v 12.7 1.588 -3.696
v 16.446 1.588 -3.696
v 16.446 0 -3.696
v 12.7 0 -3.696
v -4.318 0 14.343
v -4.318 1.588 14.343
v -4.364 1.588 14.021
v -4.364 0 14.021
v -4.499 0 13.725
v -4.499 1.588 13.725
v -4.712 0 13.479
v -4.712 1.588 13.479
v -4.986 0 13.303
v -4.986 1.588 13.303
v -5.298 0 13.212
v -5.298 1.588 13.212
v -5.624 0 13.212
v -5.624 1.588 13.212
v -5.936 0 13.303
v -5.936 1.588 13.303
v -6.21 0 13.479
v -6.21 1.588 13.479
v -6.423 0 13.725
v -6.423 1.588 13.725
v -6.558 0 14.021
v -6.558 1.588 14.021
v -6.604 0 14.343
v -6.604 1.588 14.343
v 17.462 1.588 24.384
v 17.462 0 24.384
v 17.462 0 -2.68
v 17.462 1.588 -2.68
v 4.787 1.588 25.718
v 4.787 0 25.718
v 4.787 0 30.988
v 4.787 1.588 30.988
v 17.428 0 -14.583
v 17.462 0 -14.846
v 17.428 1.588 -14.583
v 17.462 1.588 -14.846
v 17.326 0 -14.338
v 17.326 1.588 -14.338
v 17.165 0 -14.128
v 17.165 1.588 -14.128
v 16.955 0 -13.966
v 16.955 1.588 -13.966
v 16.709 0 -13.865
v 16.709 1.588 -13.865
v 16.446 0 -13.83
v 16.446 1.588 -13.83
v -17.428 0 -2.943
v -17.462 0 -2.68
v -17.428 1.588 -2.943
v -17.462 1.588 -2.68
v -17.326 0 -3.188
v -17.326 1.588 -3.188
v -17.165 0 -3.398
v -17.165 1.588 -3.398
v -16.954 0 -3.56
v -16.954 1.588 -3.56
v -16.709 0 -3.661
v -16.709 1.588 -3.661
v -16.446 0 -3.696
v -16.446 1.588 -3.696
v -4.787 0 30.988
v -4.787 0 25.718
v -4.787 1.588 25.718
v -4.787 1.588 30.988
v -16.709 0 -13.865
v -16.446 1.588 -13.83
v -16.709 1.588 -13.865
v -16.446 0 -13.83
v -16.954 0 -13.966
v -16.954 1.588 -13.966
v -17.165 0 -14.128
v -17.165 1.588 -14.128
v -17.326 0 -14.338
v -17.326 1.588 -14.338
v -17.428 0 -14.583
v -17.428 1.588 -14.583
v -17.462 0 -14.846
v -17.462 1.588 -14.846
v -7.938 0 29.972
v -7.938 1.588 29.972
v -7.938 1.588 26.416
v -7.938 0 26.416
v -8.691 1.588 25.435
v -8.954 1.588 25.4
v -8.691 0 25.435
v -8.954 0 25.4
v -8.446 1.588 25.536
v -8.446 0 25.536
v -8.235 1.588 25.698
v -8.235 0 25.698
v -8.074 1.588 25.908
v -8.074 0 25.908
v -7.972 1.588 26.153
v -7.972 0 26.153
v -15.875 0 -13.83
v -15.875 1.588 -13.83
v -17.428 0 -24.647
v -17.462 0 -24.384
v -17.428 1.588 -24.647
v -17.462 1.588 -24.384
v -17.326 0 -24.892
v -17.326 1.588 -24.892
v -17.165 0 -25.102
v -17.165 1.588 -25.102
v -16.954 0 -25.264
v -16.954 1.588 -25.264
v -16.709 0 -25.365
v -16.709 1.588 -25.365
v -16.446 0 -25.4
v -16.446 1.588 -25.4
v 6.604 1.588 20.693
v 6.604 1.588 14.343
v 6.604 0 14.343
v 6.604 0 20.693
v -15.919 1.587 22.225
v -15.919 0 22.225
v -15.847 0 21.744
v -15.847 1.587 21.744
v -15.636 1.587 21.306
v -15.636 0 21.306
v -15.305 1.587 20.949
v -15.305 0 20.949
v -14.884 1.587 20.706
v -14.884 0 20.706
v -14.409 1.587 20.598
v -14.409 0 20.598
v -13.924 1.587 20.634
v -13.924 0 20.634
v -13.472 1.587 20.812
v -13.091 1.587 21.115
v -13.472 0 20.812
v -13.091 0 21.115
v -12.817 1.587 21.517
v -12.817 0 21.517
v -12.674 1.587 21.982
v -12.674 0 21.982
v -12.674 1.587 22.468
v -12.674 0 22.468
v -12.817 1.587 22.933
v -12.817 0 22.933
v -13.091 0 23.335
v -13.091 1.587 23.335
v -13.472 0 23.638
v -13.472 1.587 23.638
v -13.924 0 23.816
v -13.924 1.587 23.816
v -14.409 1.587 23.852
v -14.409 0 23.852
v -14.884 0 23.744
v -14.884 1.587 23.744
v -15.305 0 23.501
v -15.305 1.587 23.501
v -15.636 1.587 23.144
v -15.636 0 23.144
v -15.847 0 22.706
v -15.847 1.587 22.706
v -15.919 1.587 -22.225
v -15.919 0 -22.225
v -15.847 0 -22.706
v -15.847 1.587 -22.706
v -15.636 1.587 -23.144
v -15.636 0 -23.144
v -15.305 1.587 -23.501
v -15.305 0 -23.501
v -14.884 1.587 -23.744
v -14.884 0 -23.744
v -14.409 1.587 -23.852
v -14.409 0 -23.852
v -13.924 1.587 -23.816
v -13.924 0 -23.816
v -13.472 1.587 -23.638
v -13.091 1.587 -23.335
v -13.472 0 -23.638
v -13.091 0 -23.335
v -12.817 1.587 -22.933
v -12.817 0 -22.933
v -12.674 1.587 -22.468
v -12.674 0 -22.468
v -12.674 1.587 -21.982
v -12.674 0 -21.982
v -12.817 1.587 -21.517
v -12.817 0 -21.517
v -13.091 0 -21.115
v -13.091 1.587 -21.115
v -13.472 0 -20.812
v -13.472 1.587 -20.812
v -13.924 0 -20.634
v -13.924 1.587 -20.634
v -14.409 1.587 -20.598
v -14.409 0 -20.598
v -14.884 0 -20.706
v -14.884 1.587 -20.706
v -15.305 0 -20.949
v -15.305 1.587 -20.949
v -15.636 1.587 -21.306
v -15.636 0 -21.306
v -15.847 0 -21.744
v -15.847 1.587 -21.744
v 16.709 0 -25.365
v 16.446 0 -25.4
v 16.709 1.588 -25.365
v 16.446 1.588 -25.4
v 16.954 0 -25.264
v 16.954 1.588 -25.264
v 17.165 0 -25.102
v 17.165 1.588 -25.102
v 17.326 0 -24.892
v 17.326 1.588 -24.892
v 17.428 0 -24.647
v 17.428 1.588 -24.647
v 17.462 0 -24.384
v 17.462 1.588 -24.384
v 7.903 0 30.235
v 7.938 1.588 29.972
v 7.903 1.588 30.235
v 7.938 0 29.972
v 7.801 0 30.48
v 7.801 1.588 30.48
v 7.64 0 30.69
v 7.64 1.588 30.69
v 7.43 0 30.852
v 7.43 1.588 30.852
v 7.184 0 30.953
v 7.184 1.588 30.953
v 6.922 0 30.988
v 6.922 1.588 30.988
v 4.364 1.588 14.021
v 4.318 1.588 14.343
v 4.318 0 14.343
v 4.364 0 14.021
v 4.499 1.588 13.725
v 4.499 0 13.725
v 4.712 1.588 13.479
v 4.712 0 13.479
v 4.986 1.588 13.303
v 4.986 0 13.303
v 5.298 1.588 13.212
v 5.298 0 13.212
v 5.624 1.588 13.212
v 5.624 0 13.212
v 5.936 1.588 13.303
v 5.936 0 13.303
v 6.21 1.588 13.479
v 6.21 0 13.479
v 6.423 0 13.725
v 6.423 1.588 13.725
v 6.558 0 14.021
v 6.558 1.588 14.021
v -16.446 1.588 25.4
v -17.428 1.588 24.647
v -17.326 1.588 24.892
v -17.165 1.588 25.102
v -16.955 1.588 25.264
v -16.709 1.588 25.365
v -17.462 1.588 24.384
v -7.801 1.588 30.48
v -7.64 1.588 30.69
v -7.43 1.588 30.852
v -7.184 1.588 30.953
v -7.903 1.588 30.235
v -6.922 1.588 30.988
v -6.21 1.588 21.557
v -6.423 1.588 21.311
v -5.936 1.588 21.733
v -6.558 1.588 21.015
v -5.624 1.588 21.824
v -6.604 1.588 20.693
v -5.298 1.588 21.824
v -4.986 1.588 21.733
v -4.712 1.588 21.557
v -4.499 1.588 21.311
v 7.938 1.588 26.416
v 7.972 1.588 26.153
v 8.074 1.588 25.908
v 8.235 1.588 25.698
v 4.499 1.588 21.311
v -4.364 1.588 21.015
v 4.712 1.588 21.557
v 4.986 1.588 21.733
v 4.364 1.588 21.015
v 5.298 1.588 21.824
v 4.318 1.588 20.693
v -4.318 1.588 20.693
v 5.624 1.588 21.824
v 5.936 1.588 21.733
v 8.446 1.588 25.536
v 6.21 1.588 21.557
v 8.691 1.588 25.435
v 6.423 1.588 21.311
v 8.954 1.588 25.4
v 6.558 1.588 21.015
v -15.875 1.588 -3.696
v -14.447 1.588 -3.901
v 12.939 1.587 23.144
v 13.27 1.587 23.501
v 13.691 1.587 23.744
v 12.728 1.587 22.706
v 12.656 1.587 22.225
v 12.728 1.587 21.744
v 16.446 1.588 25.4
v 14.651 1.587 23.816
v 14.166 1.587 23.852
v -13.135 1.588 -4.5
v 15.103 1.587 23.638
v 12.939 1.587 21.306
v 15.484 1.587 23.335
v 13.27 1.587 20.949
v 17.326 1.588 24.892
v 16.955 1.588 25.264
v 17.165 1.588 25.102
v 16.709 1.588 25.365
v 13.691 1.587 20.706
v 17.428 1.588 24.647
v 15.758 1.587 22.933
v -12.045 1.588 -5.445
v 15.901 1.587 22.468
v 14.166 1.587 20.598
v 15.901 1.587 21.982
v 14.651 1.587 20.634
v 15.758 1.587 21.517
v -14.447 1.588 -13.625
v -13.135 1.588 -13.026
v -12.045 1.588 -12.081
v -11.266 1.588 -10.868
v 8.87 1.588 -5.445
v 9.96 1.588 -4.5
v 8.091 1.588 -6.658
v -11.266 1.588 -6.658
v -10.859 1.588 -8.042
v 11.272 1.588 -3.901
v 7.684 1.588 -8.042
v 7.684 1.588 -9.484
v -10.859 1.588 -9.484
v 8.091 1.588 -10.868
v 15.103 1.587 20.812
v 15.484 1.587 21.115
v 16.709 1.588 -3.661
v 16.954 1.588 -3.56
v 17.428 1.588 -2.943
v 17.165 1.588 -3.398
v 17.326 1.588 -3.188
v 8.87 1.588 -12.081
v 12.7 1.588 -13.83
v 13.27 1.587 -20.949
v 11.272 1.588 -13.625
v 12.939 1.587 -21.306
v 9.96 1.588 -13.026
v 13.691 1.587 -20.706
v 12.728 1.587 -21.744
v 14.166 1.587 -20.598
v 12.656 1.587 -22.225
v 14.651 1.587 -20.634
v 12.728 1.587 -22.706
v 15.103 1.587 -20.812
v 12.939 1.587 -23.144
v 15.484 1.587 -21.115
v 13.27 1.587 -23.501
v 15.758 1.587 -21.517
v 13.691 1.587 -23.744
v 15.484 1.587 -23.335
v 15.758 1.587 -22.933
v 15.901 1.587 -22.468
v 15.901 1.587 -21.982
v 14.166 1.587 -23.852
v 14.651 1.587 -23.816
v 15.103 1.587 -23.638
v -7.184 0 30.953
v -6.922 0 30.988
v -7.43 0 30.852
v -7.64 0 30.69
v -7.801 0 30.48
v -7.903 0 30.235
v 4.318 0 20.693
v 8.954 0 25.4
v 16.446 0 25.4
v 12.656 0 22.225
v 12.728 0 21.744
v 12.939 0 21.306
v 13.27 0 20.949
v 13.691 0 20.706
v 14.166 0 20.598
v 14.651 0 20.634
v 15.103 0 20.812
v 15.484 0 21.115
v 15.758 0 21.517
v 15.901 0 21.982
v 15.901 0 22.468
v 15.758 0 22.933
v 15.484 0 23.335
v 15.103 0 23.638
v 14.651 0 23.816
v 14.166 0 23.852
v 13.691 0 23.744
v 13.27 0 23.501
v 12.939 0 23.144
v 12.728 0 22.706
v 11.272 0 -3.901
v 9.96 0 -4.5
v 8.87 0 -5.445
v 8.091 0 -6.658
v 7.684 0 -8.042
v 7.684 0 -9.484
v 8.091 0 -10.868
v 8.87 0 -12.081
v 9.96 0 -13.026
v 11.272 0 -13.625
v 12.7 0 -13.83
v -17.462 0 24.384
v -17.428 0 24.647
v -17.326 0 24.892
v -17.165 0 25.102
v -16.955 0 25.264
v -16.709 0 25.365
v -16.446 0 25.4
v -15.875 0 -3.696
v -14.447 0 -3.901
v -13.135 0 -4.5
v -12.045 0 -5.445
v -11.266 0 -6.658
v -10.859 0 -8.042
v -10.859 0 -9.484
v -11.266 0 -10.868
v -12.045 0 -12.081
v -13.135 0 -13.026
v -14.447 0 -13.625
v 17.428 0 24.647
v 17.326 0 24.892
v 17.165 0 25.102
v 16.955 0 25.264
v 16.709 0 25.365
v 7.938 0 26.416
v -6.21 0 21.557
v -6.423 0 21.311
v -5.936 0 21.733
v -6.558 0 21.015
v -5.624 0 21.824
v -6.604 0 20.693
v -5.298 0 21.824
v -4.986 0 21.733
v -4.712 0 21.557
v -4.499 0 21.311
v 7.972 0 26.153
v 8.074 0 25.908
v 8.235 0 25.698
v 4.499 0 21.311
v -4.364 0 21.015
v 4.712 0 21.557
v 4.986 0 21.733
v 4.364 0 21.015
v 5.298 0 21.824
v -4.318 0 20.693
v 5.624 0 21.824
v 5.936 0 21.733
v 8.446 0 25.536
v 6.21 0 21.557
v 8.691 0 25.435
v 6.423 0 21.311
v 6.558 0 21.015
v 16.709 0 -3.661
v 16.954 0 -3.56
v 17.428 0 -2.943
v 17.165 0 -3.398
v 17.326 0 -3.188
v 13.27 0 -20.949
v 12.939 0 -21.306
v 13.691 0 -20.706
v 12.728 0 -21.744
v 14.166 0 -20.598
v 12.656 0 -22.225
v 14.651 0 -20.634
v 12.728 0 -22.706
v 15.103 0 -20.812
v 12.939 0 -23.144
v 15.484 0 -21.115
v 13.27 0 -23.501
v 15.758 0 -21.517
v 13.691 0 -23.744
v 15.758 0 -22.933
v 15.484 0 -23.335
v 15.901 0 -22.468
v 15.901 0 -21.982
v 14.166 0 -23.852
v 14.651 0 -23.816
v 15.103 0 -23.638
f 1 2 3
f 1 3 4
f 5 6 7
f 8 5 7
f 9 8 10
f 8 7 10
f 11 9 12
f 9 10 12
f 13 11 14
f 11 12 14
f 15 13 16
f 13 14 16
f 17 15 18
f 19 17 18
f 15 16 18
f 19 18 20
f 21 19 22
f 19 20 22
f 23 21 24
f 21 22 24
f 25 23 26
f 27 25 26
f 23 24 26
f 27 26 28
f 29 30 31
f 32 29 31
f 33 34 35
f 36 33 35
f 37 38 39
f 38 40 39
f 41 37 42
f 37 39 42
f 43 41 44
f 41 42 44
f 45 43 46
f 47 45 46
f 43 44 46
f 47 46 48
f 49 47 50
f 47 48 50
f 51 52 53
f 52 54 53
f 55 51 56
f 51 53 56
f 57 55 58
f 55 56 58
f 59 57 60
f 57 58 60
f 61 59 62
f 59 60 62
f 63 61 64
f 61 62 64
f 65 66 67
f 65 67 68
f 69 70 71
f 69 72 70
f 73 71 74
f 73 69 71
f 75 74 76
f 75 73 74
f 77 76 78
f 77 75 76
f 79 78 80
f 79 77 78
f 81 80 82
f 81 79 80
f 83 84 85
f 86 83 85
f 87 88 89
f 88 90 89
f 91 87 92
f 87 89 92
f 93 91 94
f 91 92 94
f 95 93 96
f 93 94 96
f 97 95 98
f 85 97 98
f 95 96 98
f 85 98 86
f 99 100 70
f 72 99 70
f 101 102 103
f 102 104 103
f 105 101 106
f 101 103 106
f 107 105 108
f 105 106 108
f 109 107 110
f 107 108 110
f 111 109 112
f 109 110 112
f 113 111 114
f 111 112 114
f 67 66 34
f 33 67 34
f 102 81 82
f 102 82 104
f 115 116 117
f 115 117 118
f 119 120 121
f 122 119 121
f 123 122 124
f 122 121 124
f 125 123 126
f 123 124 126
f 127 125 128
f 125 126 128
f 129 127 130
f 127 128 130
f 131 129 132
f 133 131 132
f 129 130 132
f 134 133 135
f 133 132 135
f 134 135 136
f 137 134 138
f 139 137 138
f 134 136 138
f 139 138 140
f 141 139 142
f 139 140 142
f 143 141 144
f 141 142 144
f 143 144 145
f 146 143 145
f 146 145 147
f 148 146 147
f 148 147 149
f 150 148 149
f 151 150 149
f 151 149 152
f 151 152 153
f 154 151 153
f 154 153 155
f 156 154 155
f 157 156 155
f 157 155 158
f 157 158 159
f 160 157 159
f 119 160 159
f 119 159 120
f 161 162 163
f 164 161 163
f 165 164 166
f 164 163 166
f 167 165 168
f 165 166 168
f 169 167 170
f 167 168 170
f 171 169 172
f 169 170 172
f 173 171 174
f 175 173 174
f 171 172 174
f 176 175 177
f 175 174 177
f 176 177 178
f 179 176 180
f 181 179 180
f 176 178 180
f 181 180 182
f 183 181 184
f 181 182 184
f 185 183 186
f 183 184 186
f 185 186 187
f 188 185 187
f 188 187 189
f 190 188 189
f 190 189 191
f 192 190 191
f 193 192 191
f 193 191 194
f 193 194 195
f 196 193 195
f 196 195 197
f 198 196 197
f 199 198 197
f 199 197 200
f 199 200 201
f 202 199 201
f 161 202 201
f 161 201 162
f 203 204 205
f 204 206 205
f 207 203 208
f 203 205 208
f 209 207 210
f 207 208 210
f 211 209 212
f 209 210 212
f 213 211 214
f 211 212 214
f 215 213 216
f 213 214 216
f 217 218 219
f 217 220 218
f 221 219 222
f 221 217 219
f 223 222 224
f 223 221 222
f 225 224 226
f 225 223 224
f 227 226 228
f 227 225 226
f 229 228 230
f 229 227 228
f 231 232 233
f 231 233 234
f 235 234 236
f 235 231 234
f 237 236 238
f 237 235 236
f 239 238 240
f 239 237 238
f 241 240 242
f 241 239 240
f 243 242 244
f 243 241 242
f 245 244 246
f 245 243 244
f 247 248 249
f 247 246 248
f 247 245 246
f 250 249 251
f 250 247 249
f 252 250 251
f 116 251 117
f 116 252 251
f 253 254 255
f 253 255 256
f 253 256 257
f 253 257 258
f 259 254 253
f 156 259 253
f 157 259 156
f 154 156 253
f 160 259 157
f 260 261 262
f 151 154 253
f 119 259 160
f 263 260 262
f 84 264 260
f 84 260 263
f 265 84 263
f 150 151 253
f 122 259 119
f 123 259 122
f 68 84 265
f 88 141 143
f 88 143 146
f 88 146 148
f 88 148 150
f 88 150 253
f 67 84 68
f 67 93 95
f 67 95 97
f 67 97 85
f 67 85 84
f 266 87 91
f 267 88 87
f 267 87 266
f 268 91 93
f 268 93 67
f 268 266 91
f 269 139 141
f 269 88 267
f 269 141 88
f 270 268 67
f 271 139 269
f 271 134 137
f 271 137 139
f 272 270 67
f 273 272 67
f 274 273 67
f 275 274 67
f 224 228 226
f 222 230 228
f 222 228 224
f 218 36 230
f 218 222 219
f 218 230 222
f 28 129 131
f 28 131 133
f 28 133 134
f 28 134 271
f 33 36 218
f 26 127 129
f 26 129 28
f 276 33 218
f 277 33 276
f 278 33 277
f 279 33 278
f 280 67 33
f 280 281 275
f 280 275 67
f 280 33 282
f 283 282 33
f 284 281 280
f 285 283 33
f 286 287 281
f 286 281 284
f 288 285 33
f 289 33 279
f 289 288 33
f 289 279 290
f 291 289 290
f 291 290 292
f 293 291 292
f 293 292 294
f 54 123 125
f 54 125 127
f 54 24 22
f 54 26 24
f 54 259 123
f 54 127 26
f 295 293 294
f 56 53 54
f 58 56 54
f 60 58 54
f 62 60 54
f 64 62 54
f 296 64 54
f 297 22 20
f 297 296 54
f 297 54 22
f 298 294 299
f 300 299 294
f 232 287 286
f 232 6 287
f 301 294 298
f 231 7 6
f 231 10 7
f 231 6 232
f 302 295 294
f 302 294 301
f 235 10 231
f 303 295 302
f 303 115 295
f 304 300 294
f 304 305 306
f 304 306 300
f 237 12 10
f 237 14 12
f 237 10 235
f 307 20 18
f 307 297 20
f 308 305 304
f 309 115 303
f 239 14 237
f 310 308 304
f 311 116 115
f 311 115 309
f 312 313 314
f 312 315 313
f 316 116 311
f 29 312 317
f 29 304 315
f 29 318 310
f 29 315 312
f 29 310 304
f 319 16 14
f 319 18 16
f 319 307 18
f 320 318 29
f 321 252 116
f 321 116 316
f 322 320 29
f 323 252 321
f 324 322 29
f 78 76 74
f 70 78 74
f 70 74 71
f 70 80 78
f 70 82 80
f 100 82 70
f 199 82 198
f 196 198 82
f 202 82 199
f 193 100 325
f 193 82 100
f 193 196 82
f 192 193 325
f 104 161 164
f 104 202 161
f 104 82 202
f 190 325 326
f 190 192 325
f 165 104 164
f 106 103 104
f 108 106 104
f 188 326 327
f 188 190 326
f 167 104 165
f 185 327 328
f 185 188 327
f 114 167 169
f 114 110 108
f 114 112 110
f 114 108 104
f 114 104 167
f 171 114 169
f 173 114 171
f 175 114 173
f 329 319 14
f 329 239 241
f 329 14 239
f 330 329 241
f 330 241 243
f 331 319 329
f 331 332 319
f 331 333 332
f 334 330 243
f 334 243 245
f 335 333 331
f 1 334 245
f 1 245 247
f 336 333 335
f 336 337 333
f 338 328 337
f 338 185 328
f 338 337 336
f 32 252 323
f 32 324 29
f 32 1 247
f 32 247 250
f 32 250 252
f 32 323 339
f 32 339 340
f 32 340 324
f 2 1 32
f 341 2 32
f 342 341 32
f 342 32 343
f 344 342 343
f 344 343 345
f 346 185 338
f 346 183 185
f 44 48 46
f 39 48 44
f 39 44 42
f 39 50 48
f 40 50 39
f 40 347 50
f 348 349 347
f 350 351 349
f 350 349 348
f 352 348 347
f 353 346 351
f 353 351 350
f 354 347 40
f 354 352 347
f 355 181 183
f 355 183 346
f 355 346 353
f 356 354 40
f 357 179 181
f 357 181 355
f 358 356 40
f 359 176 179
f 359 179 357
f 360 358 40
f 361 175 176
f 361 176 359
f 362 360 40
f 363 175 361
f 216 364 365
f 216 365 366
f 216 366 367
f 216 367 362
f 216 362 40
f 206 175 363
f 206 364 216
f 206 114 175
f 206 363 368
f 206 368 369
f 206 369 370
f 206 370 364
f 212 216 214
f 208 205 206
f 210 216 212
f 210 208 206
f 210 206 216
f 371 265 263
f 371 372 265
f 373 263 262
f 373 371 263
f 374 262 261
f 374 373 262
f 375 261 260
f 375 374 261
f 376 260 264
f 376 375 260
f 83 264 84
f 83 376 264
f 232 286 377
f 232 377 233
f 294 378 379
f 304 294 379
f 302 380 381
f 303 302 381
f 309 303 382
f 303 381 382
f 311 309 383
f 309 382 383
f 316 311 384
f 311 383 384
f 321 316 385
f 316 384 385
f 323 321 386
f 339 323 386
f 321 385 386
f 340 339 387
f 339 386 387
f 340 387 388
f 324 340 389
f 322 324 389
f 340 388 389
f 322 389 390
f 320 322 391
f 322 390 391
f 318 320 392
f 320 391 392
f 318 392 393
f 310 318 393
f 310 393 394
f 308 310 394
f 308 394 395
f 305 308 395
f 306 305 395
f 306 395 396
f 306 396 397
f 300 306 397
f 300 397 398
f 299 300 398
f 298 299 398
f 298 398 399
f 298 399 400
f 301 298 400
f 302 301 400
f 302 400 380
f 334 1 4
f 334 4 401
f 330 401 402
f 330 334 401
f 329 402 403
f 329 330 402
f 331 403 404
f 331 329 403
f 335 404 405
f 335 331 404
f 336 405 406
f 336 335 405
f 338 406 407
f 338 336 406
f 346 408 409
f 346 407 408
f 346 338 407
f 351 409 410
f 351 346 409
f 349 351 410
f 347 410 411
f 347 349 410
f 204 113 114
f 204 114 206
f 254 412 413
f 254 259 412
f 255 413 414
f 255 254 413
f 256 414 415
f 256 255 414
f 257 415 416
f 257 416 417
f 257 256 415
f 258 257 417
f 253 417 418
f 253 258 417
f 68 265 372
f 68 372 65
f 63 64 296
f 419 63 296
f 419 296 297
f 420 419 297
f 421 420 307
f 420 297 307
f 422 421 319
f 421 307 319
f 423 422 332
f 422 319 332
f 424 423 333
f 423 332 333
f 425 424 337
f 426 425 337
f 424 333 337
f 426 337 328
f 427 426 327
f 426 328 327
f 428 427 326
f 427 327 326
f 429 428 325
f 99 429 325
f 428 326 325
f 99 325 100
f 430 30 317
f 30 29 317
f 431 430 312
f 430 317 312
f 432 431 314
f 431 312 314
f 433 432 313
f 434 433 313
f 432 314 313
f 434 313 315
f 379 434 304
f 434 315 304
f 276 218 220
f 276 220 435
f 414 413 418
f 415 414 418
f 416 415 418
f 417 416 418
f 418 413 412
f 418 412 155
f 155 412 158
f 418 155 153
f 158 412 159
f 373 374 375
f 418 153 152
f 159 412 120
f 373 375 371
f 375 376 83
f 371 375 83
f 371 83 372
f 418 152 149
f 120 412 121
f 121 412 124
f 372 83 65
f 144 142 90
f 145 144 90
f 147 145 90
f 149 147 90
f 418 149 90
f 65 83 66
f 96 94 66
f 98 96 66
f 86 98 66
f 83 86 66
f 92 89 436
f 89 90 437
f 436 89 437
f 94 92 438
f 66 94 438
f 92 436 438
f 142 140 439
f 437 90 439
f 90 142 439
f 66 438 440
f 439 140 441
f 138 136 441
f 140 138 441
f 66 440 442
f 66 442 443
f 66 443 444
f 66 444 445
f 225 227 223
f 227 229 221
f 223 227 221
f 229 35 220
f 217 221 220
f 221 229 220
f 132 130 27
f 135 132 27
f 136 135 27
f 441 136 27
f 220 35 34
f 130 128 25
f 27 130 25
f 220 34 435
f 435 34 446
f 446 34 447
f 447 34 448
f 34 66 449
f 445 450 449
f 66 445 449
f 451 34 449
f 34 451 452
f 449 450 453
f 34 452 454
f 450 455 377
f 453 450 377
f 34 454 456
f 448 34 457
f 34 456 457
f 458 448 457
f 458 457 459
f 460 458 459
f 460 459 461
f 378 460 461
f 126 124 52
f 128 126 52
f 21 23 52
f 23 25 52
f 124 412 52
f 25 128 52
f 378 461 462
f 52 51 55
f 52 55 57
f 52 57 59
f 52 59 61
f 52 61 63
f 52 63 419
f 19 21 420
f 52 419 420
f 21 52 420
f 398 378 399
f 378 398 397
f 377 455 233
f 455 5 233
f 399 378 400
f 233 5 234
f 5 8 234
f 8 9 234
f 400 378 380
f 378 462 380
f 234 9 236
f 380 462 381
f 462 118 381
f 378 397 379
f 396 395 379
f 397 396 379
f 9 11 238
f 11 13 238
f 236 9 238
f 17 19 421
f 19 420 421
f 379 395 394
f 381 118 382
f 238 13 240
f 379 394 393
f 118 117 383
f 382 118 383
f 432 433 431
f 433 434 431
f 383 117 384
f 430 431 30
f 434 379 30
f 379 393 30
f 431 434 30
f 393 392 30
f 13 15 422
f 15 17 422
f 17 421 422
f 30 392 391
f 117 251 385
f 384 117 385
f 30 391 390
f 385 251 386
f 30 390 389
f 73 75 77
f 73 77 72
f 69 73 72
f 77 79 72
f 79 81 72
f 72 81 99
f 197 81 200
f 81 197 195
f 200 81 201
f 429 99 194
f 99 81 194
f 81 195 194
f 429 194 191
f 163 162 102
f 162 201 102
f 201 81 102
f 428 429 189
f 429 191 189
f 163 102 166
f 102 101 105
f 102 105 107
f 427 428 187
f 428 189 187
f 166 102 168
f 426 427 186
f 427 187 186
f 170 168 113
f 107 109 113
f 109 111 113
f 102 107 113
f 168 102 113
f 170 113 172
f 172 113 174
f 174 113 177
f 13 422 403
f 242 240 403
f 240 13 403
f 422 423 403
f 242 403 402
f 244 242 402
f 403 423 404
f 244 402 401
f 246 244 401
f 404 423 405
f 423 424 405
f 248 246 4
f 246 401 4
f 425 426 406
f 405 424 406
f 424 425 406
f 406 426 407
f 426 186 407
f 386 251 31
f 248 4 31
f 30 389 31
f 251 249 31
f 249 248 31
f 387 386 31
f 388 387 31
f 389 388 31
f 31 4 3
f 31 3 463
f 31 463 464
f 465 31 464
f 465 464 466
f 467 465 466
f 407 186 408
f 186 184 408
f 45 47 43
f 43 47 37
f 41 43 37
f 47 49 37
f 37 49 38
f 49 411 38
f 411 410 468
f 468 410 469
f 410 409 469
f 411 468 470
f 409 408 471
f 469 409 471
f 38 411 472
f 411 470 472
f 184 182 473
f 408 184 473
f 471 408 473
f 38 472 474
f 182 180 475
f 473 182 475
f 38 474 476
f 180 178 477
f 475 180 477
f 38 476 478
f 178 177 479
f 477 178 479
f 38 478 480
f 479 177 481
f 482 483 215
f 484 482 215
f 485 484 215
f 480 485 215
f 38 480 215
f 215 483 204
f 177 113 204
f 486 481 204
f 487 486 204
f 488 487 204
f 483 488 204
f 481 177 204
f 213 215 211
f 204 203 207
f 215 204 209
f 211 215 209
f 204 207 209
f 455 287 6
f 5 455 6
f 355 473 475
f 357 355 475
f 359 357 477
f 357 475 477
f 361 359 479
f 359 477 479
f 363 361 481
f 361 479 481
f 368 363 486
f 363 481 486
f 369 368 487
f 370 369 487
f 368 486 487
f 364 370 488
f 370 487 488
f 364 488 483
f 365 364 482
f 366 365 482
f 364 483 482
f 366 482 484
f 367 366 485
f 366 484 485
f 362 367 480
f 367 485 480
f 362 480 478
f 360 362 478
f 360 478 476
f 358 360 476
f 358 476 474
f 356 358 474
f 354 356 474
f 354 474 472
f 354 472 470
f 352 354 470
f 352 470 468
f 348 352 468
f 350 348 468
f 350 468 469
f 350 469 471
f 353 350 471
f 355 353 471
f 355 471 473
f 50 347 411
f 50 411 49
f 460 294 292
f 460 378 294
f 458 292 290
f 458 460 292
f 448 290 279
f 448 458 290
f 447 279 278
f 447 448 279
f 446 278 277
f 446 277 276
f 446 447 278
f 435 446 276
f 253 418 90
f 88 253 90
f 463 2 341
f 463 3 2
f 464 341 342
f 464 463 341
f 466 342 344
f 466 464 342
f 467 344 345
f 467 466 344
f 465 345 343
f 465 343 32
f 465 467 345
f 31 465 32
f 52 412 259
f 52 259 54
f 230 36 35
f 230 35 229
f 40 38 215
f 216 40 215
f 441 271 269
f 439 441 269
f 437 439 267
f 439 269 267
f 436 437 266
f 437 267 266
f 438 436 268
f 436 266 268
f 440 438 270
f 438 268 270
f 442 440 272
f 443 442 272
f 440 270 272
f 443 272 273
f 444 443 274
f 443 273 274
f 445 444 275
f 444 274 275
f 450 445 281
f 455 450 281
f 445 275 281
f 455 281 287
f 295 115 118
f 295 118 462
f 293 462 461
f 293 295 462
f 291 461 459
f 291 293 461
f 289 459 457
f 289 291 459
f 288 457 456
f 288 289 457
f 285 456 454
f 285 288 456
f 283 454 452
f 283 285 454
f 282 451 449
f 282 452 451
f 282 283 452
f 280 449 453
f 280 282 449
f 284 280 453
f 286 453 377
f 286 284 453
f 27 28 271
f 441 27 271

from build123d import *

# Parameters (mm, degrees)
SKETCH1_W             = 34.925
SKETCH1_H             = 50.8
BOSS_EXTRUDE1_DEPTH   = 1.5875
F_4_CLEARANCE_HOLE1_D = 3.2639
SKETCH6_W             = 15.875
SKETCH6_H             = 5.588
BOSS_EXTRUDE2_DEPTH   = 1.5875
CUT_EXTRUDE1_DEPTH    = 36.604988506
CUT_EXTRUDE2_DEPTH    = 36.604988506
SKETCH9_W             = 9.573595876
SKETCH9_H             = 10.540114366
CUT_EXTRUDE3_DEPTH    = 36.604988506
FILLET1_R             = 1.016


with BuildPart() as part:
    # Sketch1 → Boss-Extrude1 (new body)
    with BuildSketch(Plane(origin=(0, 0, 0), x_dir=(1, 0, 0), z_dir=(0, 1, 0))):
        Rectangle(SKETCH1_W, SKETCH1_H)
    extrude(amount=BOSS_EXTRUDE1_DEPTH)

    # #4 Clearance Hole1 (through all)
    with Locations(Plane(origin=(0, 1.5875, 0), x_dir=(1, 0, 0), z_dir=(0, 1, 0))):
        with Locations((-14.2875, 22.225), (14.2875, 22.225), (14.2875, -22.225), (-14.2875, -22.225)):
            Hole(F_4_CLEARANCE_HOLE1_D / 2)

    # Sketch6 → Boss-Extrude2 (add)
    with BuildSketch(Plane(origin=(0, 1.5875, 0), x_dir=(1, 0, 0), z_dir=(0, 1, 0))):
        with Locations((0, -28.194)):
            Rectangle(SKETCH6_W, SKETCH6_H)
    extrude(amount=-BOSS_EXTRUDE2_DEPTH)

    # Sketch7 → Cut-Extrude1 (cut, through all)
    with BuildSketch(Plane(origin=(0, 1.5875, 0), x_dir=(1, 0, 0), z_dir=(0, 1, 0))):
        with BuildLine():
            Line((-15.875, 13.8303), (-20.9423, 13.8303))
            Line((-20.9423, 13.8303), (-20.9423, 8.763))
            Line((-20.9423, 8.763), (-20.9423, 3.6957))
            Line((-20.9423, 3.6957), (-15.875, 3.6957))
            ThreePointArc((-15.875, 3.6957), (-10.8077, 8.763), (-15.875, 13.8303))
        make_face()
        with BuildLine():
            Line((12.7, 13.8303), (17.7673, 13.8303))
            Line((17.7673, 13.8303), (17.7673, 8.763))
            Line((17.7673, 8.763), (17.7673, 3.6957))
            Line((17.7673, 3.6957), (12.7, 3.6957))
            ThreePointArc((12.7, 3.6957), (7.6327, 8.763), (12.7, 13.8303))
        make_face()
    extrude(amount=-CUT_EXTRUDE1_DEPTH, mode=Mode.SUBTRACT)

    # Sketch8 → Cut-Extrude2 (cut, through all)
    with BuildSketch(Plane(origin=(0, 1.5875, 0), x_dir=(1, 0, 0), z_dir=(0, 1, 0))):
        with BuildLine():
            Line((6.604, -14.342881029), (6.604, -20.692881029))
            ThreePointArc((6.604, -20.692881029), (5.461, -21.835881029), (4.318, -20.692881029))
            Line((4.318, -20.692881029), (4.318, -14.342881029))
            ThreePointArc((4.318, -14.342881029), (5.461, -13.199881029), (6.604, -14.342881029))
        make_face()
    cut_extrude2 = extrude(amount=-CUT_EXTRUDE2_DEPTH, mode=Mode.SUBTRACT)

    # Mirror1: Cut-Extrude2 across plane
    add(cut_extrude2.mirror(Plane(origin=(0, 0, 0), x_dir=(0, 0, 1), z_dir=(1, 0, 0))), mode=Mode.SUBTRACT)

    # Sketch9 → Cut-Extrude3 (cut, through all)
    with BuildSketch(Plane.XZ):
        with Locations((0, 30.988)):
            Rectangle(SKETCH9_W, SKETCH9_H)
    extrude(amount=-CUT_EXTRUDE3_DEPTH, mode=Mode.SUBTRACT)

    # Fillet1
    fillet1_edges = [part.edges().sort_by_distance(p)[0] for p in [
        (-7.9375, 0.79375, 25.4),
        (7.9375, 0.79375, 25.4),
        (7.9375, 0.79375, 30.988),
        (-7.9375, 0.79375, 30.988),
        (-17.4625, 0.79375, -3.6957),
        (-17.4625, 0.79375, -13.8303),
        (17.4625, 0.79375, -13.8303),
        (17.4625, 0.79375, -3.6957),
        (-17.4625, 0.79375, 25.4),
        (-17.4625, 0.79375, -25.4),
        (17.4625, 0.79375, -25.4),
        (17.4625, 0.79375, 25.4),
    ]]
    fillet(fillet1_edges, radius=FILLET1_R)


solid = part.part
